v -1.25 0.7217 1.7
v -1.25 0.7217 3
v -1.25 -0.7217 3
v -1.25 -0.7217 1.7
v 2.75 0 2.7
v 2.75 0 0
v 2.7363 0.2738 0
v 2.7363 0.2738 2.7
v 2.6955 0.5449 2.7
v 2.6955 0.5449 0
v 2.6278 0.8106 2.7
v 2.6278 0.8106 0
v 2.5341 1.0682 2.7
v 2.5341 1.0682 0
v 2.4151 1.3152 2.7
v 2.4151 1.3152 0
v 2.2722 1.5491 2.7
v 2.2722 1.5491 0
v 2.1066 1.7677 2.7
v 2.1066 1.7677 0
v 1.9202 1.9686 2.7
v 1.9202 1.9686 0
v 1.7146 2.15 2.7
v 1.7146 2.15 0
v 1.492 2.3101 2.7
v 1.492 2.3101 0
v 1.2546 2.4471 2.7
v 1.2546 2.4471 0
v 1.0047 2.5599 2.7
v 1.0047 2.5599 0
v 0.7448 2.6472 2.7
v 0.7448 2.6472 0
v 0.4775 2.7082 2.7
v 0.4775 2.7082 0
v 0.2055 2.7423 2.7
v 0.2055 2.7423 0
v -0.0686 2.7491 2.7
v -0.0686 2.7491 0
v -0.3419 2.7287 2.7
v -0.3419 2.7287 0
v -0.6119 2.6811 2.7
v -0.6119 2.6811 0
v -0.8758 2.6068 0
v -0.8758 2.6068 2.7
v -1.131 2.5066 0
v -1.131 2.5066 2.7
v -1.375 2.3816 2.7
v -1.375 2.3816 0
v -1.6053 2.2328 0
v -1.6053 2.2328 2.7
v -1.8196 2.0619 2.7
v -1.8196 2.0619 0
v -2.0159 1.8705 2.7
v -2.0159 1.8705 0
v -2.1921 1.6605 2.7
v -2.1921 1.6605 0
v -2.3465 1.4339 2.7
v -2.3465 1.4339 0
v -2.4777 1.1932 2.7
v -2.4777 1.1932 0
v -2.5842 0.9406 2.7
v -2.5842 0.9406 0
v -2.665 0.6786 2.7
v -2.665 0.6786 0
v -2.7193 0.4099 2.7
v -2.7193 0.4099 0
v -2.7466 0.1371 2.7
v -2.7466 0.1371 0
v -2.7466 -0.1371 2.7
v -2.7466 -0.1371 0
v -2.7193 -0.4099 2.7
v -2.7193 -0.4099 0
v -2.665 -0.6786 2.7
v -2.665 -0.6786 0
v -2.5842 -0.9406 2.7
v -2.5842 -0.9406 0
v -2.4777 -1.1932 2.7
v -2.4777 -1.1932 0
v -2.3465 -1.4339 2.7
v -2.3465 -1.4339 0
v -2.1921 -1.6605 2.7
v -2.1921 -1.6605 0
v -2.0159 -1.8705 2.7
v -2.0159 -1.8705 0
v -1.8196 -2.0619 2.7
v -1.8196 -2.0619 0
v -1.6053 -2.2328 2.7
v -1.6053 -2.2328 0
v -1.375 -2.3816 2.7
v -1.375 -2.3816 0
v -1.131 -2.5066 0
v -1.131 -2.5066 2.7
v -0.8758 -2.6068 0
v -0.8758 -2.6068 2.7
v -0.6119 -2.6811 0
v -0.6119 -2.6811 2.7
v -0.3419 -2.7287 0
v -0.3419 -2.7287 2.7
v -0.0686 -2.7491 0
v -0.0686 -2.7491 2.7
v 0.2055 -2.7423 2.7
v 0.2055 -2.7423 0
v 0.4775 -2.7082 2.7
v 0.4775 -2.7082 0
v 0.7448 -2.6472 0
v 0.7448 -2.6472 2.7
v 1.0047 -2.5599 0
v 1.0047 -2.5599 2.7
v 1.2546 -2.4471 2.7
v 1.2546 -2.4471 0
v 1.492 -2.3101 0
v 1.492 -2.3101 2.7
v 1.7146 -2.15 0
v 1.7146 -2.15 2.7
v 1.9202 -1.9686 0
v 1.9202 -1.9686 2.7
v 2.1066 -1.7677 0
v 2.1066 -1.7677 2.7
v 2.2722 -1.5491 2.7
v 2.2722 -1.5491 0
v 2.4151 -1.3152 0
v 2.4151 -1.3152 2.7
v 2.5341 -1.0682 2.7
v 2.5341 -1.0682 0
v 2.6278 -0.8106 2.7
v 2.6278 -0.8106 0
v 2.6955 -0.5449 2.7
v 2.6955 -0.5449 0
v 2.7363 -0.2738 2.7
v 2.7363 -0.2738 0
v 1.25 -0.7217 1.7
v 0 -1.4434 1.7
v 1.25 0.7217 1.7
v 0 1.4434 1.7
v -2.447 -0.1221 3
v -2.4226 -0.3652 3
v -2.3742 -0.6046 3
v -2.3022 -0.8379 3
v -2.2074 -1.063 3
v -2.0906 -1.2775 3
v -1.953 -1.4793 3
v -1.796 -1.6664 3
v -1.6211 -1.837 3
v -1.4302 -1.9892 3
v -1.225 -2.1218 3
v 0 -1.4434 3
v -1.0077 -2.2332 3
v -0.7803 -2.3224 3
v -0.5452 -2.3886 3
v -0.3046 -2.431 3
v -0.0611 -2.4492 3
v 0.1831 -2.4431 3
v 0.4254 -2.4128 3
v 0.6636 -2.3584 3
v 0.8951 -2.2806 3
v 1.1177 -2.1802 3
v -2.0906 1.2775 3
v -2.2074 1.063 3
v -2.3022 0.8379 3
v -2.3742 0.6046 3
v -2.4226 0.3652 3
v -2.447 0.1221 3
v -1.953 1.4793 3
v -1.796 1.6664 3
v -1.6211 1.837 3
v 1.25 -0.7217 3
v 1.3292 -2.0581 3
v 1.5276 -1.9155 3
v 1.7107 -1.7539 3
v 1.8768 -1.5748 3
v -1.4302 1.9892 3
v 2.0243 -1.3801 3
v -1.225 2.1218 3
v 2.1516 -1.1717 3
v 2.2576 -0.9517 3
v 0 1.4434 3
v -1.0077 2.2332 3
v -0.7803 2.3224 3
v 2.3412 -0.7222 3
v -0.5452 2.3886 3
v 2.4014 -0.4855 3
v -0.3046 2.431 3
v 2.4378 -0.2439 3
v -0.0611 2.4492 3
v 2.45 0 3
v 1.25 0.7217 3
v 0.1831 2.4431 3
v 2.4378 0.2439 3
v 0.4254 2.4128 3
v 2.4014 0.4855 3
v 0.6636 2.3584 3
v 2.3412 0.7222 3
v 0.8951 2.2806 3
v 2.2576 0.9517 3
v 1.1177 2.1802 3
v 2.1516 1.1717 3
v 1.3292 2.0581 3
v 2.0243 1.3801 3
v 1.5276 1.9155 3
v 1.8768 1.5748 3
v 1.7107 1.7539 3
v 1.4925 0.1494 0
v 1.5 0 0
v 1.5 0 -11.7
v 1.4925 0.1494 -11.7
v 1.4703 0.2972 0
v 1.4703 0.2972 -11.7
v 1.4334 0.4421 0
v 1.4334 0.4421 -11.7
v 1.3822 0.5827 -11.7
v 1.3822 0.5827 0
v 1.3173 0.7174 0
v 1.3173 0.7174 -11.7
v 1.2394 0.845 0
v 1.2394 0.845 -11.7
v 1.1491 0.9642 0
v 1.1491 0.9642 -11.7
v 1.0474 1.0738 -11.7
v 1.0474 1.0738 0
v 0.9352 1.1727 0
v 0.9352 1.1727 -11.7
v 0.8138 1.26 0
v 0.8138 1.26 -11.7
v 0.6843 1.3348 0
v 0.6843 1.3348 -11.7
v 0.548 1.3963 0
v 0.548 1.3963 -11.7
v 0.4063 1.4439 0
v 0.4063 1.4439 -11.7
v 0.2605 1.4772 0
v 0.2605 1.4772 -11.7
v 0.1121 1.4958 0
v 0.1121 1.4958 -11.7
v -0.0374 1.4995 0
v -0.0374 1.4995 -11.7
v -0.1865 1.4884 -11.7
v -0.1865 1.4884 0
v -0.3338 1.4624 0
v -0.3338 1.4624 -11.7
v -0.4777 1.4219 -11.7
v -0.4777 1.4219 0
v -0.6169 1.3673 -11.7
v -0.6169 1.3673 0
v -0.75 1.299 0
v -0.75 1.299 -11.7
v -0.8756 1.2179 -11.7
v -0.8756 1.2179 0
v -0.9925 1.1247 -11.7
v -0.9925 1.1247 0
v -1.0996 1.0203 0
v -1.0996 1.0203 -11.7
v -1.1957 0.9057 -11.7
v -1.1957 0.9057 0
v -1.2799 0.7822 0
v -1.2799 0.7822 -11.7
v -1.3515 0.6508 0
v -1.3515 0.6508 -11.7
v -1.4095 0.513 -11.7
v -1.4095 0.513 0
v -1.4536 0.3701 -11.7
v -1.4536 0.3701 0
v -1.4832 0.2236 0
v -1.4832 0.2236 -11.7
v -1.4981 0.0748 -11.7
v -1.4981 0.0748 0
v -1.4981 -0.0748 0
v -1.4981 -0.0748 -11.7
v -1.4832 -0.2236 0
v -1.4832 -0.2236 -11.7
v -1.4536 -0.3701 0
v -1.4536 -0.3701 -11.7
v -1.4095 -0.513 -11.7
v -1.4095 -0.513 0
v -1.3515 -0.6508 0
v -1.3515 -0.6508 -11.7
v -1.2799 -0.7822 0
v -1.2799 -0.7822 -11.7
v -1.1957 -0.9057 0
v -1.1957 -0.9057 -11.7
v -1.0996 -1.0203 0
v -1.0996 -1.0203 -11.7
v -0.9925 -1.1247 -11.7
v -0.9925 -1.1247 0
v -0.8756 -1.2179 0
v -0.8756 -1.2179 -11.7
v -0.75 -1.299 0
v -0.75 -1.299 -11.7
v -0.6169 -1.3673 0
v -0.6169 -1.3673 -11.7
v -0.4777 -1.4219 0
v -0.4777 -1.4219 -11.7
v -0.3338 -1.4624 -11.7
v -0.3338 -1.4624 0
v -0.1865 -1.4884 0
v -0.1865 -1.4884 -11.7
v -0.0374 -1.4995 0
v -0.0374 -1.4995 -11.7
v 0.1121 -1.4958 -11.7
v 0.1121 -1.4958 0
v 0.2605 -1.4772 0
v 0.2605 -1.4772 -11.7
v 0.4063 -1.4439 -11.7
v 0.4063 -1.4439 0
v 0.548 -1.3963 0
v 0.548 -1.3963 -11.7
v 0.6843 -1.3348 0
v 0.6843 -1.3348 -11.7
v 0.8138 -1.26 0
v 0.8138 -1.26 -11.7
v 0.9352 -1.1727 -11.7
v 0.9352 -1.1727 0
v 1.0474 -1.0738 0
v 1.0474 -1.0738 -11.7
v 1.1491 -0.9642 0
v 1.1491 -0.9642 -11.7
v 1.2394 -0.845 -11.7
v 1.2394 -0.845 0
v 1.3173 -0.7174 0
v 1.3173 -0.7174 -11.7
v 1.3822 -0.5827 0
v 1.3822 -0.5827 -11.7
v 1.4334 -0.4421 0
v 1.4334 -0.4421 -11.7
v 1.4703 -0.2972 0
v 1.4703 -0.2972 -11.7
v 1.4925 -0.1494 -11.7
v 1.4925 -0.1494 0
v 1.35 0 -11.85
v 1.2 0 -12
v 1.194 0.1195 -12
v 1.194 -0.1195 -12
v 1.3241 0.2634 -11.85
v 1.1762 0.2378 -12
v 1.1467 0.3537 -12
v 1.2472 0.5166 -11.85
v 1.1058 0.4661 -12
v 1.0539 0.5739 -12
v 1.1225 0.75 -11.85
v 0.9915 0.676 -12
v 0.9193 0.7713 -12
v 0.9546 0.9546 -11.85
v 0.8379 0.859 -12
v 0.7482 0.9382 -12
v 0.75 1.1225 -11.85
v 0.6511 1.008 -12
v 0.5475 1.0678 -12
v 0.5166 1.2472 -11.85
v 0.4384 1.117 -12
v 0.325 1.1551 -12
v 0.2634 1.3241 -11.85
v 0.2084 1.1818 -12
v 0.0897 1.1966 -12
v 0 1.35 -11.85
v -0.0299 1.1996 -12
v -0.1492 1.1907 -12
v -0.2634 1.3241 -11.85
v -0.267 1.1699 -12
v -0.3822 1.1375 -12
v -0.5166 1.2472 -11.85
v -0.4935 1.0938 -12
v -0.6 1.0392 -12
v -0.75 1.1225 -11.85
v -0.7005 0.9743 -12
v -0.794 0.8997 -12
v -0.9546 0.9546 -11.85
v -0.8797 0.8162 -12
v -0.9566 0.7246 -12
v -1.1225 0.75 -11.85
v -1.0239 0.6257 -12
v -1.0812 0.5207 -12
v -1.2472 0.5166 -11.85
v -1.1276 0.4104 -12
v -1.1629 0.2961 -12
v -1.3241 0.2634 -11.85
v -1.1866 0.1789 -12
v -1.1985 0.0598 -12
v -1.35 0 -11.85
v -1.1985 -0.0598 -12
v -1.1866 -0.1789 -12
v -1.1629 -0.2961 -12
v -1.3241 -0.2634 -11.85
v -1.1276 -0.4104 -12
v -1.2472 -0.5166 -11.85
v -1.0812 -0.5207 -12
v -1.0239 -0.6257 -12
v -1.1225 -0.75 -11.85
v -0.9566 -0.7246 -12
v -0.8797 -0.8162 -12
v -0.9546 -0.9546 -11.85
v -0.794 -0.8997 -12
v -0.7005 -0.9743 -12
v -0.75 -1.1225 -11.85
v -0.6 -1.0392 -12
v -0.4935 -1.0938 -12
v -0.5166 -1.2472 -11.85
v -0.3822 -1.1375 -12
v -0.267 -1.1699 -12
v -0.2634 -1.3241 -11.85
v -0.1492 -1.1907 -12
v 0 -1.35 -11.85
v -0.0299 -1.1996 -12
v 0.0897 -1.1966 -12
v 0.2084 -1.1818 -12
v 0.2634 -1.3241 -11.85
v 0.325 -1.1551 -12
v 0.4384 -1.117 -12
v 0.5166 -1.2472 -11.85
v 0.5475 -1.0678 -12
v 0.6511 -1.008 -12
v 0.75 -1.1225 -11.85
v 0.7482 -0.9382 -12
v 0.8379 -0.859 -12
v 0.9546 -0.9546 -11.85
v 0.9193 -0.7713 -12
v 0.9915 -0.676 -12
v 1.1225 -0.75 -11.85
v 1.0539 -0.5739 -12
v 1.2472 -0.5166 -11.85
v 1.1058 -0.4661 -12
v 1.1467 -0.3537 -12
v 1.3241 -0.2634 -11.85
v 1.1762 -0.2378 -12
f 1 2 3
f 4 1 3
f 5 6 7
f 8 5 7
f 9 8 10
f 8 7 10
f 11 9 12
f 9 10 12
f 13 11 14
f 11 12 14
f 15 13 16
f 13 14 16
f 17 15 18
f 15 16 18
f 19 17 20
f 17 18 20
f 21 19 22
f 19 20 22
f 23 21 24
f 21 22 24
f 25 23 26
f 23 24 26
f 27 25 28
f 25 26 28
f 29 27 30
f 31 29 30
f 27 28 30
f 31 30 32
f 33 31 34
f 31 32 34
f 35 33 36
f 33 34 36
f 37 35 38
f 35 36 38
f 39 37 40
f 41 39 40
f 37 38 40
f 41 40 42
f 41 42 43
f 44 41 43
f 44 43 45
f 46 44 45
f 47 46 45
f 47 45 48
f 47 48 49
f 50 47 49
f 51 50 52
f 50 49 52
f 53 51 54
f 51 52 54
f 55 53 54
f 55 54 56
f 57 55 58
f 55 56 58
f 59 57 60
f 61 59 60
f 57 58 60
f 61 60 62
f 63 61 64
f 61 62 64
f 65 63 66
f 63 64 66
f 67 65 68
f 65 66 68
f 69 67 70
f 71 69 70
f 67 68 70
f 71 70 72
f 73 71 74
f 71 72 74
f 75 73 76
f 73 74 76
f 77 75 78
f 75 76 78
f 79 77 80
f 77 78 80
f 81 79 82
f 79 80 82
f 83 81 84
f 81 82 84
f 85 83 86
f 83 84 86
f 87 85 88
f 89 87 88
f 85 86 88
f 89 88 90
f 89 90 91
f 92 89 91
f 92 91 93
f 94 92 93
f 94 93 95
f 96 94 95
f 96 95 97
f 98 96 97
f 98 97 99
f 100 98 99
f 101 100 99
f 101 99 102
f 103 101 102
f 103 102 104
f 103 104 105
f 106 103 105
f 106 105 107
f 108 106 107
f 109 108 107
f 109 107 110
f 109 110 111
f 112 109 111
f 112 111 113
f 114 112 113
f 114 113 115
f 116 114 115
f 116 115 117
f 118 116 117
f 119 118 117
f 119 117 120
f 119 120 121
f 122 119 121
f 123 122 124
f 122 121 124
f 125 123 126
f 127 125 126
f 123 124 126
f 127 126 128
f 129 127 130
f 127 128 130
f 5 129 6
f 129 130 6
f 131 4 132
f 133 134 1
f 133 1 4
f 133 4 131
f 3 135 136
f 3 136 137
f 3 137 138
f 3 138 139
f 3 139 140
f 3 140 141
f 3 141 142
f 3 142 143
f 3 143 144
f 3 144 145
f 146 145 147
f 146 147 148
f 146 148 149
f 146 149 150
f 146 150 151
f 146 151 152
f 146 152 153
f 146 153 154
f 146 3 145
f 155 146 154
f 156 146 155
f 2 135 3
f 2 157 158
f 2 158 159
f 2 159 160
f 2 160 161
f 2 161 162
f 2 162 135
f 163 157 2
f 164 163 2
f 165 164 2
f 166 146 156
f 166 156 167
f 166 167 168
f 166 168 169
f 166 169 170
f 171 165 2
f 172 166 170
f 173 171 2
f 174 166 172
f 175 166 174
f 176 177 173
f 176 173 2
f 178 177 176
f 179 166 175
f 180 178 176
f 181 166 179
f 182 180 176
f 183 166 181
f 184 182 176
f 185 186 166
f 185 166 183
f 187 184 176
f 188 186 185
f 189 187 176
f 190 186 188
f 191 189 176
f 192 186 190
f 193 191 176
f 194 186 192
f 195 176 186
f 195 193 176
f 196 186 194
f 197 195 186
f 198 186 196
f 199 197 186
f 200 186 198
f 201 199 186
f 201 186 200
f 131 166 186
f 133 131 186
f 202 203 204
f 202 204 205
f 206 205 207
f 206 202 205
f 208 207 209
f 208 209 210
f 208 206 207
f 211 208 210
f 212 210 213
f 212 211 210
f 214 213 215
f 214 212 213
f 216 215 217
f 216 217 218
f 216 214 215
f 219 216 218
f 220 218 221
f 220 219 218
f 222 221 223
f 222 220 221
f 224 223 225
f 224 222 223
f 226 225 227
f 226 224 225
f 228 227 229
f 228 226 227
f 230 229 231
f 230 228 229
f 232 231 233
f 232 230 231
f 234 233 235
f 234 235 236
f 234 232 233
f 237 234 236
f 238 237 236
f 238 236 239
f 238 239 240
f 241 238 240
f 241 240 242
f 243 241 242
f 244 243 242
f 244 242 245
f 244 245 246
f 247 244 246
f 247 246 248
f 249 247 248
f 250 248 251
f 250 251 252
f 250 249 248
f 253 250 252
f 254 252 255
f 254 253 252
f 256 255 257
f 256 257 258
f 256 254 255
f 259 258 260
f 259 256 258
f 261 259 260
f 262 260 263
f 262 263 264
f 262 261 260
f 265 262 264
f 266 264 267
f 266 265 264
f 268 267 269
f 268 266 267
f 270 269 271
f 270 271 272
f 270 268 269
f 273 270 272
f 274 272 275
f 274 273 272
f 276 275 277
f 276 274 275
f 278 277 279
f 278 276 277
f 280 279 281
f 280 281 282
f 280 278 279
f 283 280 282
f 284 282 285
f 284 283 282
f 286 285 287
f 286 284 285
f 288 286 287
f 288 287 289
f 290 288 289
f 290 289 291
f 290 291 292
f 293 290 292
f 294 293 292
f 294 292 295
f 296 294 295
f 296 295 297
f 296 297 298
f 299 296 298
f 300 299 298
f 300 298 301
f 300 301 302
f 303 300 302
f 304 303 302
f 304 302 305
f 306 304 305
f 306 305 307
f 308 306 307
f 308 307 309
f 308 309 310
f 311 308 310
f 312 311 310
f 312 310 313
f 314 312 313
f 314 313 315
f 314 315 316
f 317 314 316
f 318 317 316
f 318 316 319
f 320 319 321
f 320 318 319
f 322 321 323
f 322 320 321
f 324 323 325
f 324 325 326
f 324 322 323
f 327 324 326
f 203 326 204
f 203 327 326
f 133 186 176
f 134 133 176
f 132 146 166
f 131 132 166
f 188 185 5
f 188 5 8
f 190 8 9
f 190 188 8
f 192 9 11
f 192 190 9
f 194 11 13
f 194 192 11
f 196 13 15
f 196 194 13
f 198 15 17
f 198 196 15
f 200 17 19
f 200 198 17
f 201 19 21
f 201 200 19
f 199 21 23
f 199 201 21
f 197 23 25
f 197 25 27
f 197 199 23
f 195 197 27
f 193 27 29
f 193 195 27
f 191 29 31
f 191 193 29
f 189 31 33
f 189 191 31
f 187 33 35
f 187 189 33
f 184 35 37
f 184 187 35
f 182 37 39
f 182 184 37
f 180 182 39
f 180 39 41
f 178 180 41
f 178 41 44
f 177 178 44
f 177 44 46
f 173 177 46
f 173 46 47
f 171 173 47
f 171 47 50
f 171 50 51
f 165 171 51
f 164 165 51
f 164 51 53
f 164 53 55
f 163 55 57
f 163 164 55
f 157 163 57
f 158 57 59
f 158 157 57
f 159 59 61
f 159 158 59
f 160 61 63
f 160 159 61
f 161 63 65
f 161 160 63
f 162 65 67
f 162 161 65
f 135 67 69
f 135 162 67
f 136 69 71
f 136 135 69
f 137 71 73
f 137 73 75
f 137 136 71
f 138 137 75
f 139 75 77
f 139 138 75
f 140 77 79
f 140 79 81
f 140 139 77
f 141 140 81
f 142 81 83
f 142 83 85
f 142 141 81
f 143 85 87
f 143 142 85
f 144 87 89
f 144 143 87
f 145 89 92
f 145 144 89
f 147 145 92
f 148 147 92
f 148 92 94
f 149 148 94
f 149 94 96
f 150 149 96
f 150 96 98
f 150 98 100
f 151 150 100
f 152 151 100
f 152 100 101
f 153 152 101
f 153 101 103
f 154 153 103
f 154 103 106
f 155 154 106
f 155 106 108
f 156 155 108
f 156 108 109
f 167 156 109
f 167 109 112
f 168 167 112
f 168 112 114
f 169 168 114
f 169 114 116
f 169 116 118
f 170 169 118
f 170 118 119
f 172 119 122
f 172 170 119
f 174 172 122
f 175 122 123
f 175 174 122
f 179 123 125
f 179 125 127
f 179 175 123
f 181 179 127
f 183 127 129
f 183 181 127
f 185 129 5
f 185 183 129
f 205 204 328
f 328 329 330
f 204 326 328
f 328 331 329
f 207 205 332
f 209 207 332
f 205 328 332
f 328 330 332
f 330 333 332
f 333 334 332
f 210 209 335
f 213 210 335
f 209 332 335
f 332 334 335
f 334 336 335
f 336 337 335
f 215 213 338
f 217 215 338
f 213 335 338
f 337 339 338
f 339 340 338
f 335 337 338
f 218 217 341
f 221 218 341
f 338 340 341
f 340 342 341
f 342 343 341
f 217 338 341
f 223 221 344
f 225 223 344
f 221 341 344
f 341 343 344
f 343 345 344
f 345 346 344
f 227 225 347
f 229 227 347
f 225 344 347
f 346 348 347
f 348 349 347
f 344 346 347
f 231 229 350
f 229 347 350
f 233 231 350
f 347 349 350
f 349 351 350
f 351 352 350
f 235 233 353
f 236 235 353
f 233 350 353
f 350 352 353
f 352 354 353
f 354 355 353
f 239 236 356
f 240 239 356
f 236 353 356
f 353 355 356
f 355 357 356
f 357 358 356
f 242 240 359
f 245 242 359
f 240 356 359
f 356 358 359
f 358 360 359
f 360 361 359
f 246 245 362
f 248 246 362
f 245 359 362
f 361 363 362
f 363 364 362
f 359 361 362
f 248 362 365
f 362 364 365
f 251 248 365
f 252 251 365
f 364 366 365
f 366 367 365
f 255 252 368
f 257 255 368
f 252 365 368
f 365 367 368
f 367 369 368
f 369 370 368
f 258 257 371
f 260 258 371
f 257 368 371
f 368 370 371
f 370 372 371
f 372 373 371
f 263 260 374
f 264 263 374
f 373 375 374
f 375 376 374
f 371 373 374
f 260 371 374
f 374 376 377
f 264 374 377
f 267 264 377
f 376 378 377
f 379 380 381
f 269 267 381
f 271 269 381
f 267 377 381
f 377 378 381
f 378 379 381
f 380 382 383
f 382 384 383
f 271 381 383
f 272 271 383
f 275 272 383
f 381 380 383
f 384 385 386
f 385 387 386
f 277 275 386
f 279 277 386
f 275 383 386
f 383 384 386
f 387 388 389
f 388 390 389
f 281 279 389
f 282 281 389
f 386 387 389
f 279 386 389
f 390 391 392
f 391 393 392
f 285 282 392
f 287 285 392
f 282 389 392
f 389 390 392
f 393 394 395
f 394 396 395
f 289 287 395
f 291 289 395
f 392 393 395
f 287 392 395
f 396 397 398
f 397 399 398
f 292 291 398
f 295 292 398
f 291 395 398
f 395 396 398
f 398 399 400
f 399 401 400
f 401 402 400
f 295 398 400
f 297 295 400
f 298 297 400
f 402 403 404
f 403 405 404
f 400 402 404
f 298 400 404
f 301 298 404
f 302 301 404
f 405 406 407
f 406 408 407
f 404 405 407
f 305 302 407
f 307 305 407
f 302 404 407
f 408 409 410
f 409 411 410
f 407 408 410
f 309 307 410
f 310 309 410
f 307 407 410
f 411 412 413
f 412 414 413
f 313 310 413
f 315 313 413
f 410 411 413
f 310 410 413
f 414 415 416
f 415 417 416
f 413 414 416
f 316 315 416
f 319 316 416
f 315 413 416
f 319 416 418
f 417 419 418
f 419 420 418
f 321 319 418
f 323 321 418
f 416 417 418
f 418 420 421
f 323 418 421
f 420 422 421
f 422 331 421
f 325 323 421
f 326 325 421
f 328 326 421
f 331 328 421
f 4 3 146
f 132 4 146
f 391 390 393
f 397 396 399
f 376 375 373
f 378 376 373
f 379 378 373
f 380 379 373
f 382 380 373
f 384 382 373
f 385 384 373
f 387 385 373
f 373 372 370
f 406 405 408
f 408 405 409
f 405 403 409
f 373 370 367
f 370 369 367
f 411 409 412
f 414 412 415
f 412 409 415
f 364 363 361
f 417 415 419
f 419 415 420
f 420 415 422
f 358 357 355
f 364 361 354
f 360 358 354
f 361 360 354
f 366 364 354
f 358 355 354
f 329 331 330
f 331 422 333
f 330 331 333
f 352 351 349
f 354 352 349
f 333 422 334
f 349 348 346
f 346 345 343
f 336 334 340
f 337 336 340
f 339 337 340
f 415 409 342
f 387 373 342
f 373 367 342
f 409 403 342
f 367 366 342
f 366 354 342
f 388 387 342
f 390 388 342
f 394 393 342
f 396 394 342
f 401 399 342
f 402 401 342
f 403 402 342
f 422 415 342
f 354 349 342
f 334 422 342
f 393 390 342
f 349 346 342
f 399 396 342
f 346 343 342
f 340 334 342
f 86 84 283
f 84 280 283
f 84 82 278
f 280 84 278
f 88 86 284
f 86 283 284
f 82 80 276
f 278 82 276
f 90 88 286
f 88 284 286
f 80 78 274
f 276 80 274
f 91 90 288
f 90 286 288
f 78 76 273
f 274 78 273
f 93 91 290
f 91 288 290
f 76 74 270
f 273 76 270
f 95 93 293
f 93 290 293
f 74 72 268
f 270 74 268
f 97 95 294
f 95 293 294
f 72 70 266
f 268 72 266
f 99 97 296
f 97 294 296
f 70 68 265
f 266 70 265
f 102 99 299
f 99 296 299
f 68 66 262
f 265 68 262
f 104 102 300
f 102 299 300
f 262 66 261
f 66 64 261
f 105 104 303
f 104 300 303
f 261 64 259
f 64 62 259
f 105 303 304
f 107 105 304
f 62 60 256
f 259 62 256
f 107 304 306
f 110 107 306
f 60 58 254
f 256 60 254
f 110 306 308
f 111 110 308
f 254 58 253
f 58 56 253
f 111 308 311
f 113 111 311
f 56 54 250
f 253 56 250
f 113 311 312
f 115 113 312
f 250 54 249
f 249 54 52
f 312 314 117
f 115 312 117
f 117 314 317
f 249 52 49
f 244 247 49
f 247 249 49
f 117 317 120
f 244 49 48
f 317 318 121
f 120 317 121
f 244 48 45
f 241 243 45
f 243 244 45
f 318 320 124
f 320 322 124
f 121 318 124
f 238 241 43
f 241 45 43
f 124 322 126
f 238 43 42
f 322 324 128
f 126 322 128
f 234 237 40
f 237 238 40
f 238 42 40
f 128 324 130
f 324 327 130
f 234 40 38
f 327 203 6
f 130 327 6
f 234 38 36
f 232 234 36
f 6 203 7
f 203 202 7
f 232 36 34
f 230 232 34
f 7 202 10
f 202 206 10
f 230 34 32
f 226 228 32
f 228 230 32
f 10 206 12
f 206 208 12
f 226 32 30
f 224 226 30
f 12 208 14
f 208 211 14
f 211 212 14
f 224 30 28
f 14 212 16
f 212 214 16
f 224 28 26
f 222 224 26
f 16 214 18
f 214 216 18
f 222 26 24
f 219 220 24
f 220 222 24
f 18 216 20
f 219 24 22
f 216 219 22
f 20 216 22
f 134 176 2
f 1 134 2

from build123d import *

# Parameters (mm, degrees)
F2_R      = 1.5
F3_DEPTH  = 12
F2_R_2    = 2.75
F3_FACE_R = 1.5
F4_DEPTH  = 3
F5_SIZE   = 0.3
F7_DEPTH  = 1.3


with BuildPart() as f3:
    # F2 (on Top) → F3 (new body)
    with BuildSketch(Plane.XY):
        Circle(F2_R)
    extrude(amount=-F3_DEPTH)

    # F2 (on Top) + F3_face (on face) → F4 (join)
    with BuildSketch(Plane.XY):
        Circle(F2_R_2)
        Circle(F2_R, mode=Mode.SUBTRACT)
    with BuildSketch(Plane.XY):
        Circle(F3_FACE_R)
    extrude(amount=F4_DEPTH)

    # F5
    f5_edges = [f3.edges().sort_by_distance(p)[0] for p in [
        (-1.5, 0, -12),
        (-2.75, 0, 3),
    ]]
    chamfer(f5_edges, length=F5_SIZE)

    # F6 (on face) → F7 (cut)
    with BuildSketch(Plane.XY.offset(3)):
        Polygon((1.25, -0.7216878365), (1.25, 0.7216878365), (0, 1.443375673), (-1.25, 0.7216878365), (-1.25, -0.7216878365), (0, -1.443375673), align=None)
    extrude(amount=-F7_DEPTH, mode=Mode.SUBTRACT)


solid = f3.part
